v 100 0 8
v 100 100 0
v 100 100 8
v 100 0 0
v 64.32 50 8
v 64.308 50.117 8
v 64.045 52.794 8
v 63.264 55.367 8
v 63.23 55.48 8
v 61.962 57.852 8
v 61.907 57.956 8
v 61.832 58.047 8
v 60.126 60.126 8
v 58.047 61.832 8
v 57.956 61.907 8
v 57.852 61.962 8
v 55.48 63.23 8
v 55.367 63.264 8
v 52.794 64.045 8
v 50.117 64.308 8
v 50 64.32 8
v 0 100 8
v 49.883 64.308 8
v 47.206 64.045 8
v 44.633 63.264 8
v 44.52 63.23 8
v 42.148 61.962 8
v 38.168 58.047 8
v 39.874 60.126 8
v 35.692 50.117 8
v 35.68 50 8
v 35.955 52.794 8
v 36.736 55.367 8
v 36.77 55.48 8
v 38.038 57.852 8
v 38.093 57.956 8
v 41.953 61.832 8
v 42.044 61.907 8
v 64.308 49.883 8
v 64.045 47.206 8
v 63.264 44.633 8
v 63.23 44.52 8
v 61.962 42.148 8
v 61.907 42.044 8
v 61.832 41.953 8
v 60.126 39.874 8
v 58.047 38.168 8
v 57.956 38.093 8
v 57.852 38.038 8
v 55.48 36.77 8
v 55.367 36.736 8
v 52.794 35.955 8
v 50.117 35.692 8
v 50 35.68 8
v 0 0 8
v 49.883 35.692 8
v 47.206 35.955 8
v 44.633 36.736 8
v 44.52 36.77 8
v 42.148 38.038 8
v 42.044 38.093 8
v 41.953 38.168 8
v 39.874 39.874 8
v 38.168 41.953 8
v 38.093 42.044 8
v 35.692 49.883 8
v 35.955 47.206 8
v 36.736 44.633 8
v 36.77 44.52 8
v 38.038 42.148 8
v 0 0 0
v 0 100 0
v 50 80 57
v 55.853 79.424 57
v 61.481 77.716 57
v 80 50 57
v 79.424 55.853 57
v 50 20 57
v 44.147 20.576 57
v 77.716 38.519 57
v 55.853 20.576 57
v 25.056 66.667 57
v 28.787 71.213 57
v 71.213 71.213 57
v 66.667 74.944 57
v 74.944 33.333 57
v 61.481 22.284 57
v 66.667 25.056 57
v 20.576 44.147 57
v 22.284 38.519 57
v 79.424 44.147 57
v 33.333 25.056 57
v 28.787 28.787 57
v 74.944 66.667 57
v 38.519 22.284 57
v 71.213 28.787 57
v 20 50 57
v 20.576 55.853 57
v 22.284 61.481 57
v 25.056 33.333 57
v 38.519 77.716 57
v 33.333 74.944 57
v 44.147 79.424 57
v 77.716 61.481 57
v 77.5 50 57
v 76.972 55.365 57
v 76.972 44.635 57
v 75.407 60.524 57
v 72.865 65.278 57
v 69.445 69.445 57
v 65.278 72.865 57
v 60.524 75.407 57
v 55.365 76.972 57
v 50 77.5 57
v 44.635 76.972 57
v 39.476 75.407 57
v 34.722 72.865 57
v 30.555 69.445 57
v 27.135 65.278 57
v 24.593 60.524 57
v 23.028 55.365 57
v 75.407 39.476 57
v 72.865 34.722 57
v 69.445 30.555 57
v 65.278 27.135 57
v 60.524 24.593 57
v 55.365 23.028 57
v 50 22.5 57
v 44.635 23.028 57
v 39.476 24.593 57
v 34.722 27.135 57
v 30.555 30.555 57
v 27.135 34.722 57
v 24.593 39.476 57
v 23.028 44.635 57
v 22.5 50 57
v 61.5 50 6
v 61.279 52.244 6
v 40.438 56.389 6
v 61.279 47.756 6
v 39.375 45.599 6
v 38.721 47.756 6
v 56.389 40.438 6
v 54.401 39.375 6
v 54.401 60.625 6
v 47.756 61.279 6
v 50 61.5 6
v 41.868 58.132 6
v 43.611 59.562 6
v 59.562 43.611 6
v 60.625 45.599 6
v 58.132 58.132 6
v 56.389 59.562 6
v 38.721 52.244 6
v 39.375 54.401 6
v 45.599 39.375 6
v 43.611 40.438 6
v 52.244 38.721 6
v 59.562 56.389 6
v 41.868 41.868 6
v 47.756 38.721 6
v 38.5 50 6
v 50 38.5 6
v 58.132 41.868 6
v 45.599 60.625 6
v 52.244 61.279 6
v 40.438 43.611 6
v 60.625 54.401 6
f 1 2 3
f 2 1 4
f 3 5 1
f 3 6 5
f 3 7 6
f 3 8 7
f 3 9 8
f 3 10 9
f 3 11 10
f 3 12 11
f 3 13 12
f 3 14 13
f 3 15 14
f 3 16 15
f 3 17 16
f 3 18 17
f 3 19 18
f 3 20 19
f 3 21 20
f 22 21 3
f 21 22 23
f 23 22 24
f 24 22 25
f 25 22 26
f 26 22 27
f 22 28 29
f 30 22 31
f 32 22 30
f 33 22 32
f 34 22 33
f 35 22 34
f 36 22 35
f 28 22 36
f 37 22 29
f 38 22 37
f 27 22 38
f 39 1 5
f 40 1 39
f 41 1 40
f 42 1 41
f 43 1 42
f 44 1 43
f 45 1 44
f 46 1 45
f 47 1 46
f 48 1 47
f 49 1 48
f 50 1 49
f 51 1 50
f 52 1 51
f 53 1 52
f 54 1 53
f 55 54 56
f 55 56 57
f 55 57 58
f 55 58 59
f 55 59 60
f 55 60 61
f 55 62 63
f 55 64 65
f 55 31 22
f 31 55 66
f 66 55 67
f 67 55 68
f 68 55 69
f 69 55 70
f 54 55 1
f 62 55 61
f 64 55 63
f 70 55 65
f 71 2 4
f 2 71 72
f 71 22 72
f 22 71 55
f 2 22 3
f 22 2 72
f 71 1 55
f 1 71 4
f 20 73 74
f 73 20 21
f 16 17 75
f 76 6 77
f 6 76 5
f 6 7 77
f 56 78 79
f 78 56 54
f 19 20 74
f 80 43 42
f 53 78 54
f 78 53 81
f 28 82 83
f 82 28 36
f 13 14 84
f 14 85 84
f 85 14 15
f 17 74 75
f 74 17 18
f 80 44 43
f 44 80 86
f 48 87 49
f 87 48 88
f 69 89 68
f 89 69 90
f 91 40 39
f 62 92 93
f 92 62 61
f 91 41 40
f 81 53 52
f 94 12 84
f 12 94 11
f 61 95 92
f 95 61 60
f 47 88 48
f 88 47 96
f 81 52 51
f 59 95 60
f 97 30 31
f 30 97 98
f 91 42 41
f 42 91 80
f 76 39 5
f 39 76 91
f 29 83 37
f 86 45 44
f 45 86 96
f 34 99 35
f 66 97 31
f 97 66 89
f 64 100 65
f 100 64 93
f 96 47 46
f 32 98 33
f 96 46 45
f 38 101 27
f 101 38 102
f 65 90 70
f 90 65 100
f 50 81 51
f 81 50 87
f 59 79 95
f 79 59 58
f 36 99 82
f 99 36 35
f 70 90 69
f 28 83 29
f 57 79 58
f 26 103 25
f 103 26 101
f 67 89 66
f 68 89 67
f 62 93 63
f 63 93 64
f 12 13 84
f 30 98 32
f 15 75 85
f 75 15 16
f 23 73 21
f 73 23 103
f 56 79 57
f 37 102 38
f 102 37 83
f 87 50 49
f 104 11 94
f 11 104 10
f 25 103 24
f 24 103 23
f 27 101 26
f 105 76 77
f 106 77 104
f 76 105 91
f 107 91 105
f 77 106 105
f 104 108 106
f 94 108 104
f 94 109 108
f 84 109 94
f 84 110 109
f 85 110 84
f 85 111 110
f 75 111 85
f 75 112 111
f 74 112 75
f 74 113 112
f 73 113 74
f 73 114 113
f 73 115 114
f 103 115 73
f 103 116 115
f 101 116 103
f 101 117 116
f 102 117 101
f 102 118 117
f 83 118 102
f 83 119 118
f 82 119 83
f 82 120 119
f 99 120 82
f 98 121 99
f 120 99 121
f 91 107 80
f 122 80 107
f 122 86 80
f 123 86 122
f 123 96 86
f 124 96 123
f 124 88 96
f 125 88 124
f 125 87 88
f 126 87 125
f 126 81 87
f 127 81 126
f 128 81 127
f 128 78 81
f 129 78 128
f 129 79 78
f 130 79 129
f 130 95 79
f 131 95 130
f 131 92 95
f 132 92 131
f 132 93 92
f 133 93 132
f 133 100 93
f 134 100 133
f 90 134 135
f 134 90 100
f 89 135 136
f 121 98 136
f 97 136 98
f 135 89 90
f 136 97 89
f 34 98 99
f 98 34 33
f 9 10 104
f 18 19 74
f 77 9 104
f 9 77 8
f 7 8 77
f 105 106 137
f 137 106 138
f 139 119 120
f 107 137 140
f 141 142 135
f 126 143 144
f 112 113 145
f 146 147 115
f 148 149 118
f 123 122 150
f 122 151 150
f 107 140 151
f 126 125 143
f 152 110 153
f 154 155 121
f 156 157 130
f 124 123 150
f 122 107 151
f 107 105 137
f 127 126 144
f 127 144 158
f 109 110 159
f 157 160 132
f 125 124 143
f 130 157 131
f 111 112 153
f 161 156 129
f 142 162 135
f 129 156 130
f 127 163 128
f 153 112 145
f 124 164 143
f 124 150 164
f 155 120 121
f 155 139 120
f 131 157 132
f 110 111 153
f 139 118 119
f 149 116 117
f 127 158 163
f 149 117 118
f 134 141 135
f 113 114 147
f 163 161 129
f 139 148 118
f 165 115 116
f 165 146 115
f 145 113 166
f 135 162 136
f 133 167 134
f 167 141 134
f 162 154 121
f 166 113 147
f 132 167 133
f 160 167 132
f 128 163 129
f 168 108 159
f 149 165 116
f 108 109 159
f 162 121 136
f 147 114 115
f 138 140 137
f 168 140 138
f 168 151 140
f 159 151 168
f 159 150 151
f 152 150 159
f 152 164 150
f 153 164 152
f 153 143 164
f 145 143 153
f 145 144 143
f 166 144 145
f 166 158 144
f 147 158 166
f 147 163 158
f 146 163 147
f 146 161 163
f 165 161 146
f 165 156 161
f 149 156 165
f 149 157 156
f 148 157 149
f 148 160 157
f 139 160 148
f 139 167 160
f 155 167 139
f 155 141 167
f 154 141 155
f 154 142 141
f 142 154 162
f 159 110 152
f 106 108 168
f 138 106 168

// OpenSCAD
$fn = 32;

// ----------------------------------------------------------------------
// Hopper: funnel with square flange
// ----------------------------------------------------------------------

// --- parameters (mm) ---
fl = 100;                 // flange side, X and Y
fl_t = 8;                 // flange thickness
cone_h = 50;              // cone height above the flange
top_d = 60;               // cone mouth diameter
bot_d = 28;               // cone spout diameter
wall = 2.5;               // cone wall thickness

bore_d = bot_d - 2 * wall;  // spout bore diameter
total_h = fl_t + cone_h - 1;  // overall height

difference() {
  union() {
    cube([fl, fl, fl_t]);
    translate([fl / 2, fl / 2, fl_t - 1])
      cylinder(h = cone_h, d1 = bot_d, d2 = top_d);
  }
  translate([fl / 2, fl / 2, fl_t - 2])
    cylinder(h = cone_h + 1, d1 = bore_d, d2 = top_d - 2 * wall);
}
